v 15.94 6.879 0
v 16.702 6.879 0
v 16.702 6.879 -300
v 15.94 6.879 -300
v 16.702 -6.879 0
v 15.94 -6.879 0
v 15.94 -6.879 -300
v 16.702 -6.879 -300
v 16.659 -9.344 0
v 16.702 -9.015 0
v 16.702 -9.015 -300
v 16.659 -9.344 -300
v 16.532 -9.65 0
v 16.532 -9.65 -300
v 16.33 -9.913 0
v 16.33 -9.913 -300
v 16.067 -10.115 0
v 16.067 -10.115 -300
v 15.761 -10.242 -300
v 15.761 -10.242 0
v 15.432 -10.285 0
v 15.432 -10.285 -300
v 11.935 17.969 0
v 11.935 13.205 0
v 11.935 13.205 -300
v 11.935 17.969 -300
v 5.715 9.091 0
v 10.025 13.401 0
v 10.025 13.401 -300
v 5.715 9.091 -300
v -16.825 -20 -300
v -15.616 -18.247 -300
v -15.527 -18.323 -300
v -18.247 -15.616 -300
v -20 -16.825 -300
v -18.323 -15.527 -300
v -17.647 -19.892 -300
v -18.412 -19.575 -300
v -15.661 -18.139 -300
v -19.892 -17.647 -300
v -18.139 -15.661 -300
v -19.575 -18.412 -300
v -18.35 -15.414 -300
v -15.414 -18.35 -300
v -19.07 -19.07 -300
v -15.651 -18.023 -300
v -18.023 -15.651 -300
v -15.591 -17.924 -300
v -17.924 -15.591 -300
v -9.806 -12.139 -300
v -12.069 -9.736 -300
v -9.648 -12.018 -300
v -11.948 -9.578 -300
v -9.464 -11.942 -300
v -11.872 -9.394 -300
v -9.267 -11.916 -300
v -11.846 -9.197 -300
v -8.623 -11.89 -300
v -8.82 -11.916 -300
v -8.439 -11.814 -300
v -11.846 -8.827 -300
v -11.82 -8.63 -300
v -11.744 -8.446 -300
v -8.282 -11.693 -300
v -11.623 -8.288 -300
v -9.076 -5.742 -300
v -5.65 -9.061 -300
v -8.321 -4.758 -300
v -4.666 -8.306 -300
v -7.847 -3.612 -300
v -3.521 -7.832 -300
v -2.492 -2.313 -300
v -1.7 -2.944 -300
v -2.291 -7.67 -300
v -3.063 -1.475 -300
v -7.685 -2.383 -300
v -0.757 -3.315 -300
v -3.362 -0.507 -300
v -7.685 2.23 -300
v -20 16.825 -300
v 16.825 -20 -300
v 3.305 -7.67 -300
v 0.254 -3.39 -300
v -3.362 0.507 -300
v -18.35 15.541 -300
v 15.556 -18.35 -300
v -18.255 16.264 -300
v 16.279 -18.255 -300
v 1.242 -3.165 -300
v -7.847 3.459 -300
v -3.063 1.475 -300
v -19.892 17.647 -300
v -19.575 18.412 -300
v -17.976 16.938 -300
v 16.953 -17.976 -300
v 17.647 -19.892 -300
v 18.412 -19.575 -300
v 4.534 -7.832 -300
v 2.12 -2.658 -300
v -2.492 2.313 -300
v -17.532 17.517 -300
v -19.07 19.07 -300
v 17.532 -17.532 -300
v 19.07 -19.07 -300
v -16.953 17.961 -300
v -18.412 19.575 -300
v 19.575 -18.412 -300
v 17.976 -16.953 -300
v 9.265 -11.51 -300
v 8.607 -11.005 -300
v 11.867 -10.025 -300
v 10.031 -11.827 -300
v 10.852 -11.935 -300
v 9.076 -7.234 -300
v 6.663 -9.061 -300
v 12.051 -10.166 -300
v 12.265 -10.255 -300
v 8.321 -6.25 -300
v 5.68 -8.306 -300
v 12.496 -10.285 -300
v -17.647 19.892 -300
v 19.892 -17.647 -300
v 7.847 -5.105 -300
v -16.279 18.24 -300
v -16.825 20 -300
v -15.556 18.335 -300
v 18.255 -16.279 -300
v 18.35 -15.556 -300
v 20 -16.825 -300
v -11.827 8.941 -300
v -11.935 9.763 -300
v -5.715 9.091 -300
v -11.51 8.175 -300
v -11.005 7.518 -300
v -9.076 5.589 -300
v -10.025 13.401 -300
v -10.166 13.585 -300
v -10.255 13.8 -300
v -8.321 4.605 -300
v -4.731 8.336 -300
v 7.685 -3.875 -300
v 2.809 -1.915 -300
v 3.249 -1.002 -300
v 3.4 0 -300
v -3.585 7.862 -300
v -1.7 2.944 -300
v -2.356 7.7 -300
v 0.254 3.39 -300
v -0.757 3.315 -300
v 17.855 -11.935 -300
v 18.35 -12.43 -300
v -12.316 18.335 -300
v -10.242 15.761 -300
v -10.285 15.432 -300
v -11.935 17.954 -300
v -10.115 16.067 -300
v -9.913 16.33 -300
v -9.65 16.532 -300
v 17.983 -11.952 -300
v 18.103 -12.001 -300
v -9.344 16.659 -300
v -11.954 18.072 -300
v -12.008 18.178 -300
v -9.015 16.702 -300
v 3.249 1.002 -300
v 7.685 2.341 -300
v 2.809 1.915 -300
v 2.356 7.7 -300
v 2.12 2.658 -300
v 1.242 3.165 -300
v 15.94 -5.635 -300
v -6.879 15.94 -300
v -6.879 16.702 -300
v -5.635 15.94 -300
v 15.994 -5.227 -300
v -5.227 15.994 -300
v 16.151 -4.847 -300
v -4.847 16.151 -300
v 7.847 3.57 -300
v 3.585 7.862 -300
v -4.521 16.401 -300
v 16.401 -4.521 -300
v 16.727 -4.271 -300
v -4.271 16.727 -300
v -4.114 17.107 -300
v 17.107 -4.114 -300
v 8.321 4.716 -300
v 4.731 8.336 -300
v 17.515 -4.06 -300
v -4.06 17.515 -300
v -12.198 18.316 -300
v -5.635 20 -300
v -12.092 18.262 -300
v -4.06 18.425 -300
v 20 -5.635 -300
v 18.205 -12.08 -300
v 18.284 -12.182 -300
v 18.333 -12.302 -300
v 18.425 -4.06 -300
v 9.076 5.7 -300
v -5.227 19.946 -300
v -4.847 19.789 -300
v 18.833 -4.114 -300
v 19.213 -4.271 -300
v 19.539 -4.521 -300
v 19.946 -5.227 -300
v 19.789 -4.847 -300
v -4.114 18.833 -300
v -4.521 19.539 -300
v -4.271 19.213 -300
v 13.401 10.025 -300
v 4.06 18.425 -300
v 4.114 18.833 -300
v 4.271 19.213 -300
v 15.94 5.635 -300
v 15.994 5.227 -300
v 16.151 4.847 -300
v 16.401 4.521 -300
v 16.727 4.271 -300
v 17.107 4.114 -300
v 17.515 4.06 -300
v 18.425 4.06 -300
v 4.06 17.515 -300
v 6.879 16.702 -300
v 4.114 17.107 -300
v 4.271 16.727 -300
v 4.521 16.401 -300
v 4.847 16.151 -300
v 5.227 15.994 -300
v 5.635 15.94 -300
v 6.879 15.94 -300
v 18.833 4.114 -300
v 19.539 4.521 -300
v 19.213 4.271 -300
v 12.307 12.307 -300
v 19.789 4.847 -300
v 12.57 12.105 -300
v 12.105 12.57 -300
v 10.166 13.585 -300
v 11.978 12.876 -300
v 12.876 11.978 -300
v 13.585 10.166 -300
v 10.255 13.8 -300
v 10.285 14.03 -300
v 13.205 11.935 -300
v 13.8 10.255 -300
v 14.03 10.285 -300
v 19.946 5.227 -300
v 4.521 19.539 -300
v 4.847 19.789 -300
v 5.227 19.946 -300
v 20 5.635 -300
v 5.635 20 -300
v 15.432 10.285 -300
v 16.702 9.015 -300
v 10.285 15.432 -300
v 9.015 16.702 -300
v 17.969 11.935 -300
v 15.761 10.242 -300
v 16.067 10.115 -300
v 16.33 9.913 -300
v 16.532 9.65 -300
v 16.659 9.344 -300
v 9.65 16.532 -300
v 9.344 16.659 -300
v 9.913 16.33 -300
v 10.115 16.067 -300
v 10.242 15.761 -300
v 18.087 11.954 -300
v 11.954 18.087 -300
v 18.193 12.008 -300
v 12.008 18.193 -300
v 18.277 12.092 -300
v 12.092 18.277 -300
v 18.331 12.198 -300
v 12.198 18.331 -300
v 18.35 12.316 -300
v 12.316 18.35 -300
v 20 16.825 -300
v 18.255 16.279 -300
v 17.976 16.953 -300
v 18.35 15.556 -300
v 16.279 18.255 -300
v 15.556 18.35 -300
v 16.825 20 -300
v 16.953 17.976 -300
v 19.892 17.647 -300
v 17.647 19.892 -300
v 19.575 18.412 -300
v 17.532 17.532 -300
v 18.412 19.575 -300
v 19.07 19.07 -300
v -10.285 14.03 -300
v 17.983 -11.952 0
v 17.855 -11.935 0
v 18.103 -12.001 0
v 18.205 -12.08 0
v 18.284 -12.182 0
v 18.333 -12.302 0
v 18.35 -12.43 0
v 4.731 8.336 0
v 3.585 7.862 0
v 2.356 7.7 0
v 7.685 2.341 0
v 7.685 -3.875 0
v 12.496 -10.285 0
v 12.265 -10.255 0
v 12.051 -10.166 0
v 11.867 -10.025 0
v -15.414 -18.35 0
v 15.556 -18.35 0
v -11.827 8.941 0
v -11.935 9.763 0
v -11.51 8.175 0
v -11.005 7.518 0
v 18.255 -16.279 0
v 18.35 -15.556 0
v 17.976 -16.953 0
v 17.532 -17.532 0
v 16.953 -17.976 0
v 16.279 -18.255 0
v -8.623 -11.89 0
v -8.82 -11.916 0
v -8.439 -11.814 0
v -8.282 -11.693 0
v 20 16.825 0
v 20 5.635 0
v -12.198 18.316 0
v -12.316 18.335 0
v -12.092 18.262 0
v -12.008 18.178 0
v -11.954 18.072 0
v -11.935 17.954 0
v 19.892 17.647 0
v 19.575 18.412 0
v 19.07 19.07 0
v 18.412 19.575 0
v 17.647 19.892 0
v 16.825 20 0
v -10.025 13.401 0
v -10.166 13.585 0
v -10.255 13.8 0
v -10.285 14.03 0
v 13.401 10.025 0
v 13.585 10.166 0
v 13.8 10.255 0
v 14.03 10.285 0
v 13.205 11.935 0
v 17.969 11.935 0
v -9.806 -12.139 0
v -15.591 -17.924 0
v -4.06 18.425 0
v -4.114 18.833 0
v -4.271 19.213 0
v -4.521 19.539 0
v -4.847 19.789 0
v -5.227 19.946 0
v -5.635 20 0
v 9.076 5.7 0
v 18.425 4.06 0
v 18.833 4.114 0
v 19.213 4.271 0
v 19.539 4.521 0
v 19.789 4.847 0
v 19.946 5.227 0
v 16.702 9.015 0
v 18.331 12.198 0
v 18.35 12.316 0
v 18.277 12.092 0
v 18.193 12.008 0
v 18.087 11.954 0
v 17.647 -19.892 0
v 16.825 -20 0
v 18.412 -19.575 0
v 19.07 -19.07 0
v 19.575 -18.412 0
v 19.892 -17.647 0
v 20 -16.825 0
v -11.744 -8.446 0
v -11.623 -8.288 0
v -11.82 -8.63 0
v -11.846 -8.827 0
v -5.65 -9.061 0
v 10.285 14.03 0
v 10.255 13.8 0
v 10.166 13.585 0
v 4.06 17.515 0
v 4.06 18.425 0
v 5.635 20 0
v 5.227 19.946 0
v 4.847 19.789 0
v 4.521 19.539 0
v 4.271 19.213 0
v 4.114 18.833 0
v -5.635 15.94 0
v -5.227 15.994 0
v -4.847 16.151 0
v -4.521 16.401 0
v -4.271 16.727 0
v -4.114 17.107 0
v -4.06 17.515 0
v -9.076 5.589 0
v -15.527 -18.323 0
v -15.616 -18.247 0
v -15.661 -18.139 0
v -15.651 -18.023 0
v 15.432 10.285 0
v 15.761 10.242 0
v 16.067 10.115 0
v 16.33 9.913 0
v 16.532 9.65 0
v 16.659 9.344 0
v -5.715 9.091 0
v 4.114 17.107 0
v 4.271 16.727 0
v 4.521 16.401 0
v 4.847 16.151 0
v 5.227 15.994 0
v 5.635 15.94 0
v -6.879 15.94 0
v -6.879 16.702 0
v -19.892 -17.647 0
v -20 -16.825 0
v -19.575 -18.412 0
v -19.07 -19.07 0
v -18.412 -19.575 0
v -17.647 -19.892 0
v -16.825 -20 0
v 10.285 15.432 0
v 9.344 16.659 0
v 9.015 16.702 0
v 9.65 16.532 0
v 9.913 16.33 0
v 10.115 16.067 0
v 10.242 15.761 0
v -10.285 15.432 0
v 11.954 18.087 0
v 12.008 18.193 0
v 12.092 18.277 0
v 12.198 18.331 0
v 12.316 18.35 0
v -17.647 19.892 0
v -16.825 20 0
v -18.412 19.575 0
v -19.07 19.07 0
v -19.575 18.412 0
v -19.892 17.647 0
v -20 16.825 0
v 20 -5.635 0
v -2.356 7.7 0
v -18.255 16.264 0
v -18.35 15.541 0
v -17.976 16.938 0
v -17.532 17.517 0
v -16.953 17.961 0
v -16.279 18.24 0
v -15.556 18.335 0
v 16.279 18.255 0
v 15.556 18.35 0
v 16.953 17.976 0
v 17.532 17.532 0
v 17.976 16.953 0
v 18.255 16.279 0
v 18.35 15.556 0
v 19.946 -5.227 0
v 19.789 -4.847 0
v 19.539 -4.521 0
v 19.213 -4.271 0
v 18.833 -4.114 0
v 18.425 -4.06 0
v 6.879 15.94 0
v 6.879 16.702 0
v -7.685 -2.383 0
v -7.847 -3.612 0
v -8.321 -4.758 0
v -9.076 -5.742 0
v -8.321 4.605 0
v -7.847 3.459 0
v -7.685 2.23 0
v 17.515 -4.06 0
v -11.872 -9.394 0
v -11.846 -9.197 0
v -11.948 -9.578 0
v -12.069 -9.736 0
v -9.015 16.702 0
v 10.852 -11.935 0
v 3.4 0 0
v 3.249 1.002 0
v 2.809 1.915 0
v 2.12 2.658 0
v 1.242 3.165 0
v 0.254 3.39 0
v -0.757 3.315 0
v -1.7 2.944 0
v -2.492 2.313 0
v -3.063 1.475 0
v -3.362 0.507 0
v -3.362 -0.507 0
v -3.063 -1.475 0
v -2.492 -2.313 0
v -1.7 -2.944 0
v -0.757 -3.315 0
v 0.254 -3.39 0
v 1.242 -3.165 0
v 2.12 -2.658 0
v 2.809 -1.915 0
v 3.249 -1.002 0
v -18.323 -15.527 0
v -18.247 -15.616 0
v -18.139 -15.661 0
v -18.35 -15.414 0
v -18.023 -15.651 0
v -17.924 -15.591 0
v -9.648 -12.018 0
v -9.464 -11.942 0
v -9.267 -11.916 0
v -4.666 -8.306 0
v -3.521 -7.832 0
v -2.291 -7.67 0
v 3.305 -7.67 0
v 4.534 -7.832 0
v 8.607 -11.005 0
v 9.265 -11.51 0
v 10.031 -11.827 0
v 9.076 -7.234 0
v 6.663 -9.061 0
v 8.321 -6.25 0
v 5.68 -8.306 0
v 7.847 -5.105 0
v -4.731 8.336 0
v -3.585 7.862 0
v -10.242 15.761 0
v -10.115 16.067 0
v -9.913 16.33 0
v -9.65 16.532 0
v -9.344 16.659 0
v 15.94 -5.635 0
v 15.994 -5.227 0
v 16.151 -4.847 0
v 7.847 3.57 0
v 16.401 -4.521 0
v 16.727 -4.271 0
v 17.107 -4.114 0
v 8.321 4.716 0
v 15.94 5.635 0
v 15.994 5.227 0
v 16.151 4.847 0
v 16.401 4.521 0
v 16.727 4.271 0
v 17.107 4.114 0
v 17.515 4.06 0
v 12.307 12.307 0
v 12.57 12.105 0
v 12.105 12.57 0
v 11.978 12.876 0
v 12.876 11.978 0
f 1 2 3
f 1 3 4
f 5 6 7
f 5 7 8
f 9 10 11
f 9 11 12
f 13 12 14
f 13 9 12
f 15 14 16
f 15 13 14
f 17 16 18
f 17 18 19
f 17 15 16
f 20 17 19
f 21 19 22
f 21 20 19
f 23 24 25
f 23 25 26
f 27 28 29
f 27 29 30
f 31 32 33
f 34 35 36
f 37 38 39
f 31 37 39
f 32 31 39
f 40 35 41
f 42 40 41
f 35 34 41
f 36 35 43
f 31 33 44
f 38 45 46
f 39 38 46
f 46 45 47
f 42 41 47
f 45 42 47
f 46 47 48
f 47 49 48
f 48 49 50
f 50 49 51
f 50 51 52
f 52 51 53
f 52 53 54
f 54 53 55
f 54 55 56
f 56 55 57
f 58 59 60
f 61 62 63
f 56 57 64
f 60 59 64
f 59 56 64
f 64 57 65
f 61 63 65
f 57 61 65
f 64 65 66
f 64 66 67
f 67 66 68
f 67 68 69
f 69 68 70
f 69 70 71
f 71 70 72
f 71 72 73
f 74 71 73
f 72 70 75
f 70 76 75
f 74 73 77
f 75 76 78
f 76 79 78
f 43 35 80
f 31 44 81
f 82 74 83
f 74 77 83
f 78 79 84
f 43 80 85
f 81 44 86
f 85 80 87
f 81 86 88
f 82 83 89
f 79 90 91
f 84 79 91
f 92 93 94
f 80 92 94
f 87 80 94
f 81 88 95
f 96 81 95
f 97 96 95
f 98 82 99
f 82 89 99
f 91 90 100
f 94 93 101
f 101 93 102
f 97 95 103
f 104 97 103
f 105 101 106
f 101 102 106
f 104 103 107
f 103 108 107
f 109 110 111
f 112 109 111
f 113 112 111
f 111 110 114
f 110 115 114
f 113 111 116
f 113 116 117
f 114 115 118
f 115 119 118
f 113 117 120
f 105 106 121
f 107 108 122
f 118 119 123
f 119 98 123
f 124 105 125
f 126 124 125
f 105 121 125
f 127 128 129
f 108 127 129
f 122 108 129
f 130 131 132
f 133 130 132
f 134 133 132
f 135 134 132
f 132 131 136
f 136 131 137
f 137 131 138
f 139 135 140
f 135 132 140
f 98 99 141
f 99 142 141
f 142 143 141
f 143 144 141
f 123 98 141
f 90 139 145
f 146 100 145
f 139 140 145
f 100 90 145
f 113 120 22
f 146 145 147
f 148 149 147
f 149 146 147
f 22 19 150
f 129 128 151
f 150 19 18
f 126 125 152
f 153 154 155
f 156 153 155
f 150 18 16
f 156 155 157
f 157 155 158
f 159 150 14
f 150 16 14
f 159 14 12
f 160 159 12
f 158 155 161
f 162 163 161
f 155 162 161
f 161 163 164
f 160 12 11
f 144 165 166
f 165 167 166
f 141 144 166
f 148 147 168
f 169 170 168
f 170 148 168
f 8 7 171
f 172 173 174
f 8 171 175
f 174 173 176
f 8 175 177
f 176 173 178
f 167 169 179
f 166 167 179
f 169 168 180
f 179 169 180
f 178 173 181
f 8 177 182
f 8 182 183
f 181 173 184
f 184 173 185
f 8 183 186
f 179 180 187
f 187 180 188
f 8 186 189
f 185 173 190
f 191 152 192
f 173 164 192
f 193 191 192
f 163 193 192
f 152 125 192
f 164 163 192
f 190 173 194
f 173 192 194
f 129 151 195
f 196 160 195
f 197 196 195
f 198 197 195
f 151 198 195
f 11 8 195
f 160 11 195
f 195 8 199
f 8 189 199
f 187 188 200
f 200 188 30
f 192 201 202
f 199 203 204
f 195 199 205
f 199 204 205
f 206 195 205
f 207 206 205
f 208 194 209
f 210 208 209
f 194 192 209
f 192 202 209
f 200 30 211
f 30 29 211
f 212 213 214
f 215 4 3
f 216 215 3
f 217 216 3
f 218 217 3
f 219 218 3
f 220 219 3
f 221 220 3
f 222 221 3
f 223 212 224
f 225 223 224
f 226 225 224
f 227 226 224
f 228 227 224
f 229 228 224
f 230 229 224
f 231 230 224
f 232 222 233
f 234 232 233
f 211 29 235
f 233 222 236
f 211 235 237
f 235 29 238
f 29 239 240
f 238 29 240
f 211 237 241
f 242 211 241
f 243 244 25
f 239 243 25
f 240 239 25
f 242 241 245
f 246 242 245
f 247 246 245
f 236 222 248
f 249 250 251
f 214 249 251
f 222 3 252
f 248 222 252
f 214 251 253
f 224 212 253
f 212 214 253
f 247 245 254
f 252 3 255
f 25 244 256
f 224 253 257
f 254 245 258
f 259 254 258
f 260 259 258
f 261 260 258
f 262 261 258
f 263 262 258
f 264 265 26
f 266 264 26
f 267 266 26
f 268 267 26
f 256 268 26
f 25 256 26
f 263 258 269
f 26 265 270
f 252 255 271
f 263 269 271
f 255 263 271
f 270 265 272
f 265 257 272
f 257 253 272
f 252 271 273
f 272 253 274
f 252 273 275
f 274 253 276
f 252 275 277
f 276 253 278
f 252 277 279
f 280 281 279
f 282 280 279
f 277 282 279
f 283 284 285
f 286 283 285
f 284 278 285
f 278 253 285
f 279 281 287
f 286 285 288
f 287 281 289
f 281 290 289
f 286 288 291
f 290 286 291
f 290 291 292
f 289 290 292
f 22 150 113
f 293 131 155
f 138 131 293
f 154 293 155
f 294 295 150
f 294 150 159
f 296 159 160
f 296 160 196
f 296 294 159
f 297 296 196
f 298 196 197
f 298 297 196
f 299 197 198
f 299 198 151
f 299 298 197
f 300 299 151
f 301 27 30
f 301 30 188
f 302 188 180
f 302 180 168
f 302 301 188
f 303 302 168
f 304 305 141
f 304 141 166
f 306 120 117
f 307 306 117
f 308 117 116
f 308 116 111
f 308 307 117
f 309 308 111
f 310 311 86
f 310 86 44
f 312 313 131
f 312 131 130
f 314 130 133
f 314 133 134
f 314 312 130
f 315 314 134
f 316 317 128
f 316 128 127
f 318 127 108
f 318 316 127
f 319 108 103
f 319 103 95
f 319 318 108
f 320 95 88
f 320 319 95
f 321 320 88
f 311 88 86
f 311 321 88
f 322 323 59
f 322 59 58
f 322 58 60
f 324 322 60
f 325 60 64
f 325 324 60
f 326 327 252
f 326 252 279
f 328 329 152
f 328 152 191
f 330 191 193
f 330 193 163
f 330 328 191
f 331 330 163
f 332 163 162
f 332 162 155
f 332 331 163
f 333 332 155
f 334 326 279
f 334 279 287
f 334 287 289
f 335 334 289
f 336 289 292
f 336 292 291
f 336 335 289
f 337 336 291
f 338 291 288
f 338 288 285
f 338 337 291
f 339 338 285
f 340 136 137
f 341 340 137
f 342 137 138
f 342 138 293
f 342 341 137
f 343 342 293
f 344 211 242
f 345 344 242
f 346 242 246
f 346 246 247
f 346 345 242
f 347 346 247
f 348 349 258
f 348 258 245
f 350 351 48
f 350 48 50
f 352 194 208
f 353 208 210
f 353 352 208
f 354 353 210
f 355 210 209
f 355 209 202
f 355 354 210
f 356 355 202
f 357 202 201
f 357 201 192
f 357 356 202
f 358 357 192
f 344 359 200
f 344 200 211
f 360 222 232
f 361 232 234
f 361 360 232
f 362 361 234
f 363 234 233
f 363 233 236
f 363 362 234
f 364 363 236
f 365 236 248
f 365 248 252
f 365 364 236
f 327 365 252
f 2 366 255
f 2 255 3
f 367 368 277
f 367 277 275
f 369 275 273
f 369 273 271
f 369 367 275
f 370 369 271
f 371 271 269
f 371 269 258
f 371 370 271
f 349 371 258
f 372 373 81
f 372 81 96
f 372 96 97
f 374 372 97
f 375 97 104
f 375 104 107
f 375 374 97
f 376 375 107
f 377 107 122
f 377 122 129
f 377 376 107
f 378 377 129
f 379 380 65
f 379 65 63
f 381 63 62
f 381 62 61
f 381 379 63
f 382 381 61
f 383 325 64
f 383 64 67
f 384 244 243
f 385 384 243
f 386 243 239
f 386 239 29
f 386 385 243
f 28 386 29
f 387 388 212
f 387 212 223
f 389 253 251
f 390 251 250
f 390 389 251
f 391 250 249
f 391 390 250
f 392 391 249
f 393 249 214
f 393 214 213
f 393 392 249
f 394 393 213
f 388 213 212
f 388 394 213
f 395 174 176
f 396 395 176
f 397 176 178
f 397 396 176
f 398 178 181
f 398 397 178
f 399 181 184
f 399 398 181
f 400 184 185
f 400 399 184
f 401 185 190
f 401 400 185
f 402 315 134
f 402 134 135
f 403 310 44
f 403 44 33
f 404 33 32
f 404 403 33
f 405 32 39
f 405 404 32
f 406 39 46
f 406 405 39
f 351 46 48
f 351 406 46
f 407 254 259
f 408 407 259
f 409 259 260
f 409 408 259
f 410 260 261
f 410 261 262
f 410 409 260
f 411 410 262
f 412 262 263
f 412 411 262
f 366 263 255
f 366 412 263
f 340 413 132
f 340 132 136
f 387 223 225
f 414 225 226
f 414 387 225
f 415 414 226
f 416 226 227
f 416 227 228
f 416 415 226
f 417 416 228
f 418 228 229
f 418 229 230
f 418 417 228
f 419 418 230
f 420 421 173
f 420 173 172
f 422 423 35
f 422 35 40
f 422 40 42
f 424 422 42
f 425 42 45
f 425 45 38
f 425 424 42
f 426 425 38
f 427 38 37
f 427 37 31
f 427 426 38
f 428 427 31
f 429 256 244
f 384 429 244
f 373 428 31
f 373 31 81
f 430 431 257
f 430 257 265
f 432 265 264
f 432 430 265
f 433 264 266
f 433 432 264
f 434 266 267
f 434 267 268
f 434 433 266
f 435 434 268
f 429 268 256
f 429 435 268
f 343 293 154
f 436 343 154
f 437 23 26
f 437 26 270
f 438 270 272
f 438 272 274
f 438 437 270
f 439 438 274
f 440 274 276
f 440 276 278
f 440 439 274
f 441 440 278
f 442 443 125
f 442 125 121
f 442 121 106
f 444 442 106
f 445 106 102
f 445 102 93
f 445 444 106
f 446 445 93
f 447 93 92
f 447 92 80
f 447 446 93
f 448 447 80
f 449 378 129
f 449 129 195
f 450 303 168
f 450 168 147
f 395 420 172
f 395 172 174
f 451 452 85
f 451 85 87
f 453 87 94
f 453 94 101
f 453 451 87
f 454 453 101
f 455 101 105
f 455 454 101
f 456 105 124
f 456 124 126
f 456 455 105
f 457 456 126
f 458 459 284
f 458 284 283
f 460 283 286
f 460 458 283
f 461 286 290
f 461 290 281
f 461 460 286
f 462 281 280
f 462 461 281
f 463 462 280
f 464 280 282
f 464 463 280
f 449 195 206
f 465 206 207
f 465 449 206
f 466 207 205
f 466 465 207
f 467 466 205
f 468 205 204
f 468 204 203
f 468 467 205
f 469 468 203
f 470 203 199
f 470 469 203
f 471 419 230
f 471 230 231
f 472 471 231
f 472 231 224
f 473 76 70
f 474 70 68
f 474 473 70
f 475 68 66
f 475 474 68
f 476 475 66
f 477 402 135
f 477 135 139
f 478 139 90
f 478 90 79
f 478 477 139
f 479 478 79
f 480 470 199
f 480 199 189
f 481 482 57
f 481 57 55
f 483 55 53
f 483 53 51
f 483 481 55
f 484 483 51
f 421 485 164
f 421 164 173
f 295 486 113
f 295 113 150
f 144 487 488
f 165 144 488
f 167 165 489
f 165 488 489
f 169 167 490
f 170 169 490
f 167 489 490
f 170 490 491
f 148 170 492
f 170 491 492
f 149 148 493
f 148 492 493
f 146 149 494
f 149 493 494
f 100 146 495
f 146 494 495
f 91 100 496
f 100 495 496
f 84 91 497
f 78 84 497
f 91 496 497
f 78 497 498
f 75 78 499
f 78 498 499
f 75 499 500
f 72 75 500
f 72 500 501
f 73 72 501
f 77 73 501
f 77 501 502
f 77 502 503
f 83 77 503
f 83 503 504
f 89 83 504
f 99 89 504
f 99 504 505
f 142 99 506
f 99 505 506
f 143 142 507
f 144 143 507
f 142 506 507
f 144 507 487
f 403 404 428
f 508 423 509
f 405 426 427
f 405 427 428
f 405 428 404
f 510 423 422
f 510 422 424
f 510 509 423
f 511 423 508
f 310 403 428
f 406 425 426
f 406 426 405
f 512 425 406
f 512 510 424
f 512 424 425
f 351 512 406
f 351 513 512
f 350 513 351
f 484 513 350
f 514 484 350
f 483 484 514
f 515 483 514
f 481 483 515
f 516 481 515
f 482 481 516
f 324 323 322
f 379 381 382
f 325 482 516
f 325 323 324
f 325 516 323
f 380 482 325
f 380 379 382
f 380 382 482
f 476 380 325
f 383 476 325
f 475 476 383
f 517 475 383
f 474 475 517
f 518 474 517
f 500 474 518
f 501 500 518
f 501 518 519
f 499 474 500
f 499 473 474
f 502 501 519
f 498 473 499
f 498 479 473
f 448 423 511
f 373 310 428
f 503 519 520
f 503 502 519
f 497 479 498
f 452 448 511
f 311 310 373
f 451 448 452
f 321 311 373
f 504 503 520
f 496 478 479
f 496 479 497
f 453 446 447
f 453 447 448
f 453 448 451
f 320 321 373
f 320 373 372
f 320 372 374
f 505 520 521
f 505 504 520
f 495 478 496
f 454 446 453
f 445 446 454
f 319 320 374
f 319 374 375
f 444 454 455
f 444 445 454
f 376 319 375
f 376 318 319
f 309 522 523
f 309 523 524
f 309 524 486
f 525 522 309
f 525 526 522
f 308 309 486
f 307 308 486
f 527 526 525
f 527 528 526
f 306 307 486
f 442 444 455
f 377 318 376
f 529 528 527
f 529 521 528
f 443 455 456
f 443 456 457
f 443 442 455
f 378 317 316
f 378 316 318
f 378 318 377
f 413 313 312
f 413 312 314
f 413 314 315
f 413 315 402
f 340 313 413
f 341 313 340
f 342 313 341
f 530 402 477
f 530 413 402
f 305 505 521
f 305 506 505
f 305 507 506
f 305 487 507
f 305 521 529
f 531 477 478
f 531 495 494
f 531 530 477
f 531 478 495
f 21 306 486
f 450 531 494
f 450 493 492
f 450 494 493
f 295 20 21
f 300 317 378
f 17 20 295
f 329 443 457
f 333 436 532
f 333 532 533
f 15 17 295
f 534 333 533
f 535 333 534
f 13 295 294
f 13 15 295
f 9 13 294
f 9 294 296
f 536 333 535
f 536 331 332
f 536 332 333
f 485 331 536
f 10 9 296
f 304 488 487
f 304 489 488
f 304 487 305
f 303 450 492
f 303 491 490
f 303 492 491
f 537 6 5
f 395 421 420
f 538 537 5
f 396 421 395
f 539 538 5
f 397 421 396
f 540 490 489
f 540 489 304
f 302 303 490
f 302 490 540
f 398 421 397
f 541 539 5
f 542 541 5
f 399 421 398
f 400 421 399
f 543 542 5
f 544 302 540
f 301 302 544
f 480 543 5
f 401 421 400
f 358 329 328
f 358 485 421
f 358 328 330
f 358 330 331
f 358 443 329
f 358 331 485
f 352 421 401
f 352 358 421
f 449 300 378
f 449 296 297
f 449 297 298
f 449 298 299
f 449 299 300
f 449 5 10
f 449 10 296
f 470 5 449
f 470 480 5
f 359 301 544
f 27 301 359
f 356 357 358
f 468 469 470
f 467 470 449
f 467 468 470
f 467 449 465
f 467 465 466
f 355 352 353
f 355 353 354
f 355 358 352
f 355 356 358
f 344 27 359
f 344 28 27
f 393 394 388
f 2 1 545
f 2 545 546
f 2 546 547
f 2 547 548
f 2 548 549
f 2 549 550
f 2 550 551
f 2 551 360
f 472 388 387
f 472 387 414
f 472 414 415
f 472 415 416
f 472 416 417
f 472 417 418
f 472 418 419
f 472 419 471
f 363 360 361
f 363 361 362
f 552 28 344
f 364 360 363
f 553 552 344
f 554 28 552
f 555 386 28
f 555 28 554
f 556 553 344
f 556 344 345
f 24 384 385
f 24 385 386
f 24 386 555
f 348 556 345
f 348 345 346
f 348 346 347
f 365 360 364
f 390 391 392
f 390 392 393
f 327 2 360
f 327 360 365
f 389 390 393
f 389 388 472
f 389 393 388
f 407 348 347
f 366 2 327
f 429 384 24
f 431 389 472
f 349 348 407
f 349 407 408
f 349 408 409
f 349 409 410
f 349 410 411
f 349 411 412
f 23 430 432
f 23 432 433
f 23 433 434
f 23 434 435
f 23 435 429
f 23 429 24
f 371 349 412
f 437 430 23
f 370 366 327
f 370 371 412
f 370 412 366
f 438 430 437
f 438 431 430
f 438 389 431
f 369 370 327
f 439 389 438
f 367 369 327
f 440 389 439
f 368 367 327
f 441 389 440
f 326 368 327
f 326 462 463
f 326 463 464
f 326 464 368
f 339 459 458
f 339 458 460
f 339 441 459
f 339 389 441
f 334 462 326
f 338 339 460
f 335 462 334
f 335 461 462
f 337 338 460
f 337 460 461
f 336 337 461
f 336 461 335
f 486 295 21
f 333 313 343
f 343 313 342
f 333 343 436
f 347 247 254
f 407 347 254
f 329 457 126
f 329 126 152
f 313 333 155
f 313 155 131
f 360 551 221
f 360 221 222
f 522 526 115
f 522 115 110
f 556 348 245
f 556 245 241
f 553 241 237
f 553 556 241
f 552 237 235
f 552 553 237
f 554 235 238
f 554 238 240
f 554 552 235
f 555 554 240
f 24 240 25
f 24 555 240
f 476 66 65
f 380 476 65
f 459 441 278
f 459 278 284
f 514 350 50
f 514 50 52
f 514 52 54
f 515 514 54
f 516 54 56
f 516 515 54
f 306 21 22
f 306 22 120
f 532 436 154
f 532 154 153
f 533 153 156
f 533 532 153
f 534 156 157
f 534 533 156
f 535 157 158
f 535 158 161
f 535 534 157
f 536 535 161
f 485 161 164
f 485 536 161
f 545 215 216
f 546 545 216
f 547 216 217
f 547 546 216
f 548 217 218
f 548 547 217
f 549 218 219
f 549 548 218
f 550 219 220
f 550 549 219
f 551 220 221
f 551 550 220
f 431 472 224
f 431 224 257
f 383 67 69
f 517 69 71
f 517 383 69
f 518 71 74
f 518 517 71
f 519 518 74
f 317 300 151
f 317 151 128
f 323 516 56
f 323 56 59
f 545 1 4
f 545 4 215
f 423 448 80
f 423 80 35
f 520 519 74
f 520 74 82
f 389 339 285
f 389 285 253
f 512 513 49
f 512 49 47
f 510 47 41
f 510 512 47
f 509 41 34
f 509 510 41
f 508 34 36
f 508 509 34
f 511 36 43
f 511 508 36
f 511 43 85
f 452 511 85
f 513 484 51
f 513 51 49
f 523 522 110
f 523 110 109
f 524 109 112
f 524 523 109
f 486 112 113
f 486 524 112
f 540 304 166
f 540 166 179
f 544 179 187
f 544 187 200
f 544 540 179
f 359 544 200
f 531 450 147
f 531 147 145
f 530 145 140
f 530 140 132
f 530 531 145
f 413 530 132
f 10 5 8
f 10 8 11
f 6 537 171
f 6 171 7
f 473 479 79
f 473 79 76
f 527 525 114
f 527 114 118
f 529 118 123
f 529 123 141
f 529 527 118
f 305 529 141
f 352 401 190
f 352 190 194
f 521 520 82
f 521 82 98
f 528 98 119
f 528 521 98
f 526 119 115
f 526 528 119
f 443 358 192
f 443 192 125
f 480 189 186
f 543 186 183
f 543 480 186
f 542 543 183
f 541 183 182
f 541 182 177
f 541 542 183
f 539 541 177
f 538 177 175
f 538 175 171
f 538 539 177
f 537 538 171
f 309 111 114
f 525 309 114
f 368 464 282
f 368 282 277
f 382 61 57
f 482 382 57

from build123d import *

# Parameters (mm, degrees)
SKETCH1_R      = 3.4
EXTRUDE1_DEPTH = 300


with BuildPart() as part:
    # Sketch1 → Extrude1 (new body)
    with BuildSketch(Plane.XY):
        with BuildLine():
            Line((2.355963526, 7.7), (-2.355963526, 7.7))
            ThreePointArc((-2.355963526, 7.7), (-4.173633293, 8.061556996), (-5.714579315, 9.091184211))
            Line((-5.714579315, 9.091184211), (-10.024617928, 13.401222824))
            ThreePointArc((-10.024617928, 13.401222824), (-10.217328904, 13.689635181), (-10.285, 14.029840753))
            Line((-10.285, 14.029840753), (-10.285, 15.432464473))
            ThreePointArc((-10.285, 15.432464473), (-9.913025612, 16.330490085), (-9.015, 16.702464473))
            Line((-9.015, 16.702464473), (-6.878524829, 16.702464473))
            Line((-6.878524829, 16.702464473), (-6.878524829, 15.94))
            Line((-6.878524829, 15.94), (-5.6348, 15.94))
            ThreePointArc((-5.6348, 15.94), (-4.521248241, 16.401248241), (-4.06, 17.5148))
            Line((-4.06, 17.5148), (-4.06, 18.4252))
            ThreePointArc((-4.06, 18.4252), (-4.521248241, 19.538751759), (-5.6348, 20))
            Line((-5.6348, 20), (-13.185697325, 20))
            Line((-13.185697325, 20), (-16.825, 20))
            ThreePointArc((-16.825, 20), (-19.07006403, 19.07006403), (-20, 16.825))
            Line((-20, 16.825), (-20, -16.825))
            ThreePointArc((-20, -16.825), (-19.07006403, -19.07006403), (-16.825, -20))
            Line((-16.825, -20), (0, -20))
            Line((0, -20), (16.825, -20))
            ThreePointArc((16.825, -20), (19.07006403, -19.07006403), (20, -16.825))
            Line((20, -16.825), (20, -13.049478217))
            Line((20, -13.049478217), (20, -5.6348))
            ThreePointArc((20, -5.6348), (19.538751759, -4.521248241), (18.4252, -4.06))
            Line((18.4252, -4.06), (17.5148, -4.06))
            ThreePointArc((17.5148, -4.06), (16.401248241, -4.521248241), (15.94, -5.6348))
            Line((15.94, -5.6348), (15.94, -6.878524829))
            Line((15.94, -6.878524829), (16.702464473, -6.878524829))
            Line((16.702464473, -6.878524829), (16.702464473, -9.015))
            ThreePointArc((16.702464473, -9.015), (16.330490085, -9.913025612), (15.432464473, -10.285))
            Line((15.432464473, -10.285), (12.495583974, -10.285))
            ThreePointArc((12.495583974, -10.285), (12.155378402, -10.217328904), (11.866966045, -10.024617928))
            Line((11.866966045, -10.024617928), (9.076184211, -7.233836094))
            ThreePointArc((9.076184211, -7.233836094), (8.046556996, -5.692890072), (7.685, -3.875220305))
            Line((7.685, -3.875220305), (7.685, 2.340963526))
            ThreePointArc((7.685, 2.340963526), (8.046556996, 4.158633293), (9.076184211, 5.699579315))
            Line((9.076184211, 5.699579315), (13.401222824, 10.024617928))
            ThreePointArc((13.401222824, 10.024617928), (13.689635181, 10.217328904), (14.029840753, 10.285))
            Line((14.029840753, 10.285), (15.432, 10.285))
            ThreePointArc((15.432, 10.285), (16.330025612, 9.913025612), (16.702, 9.015))
            Line((16.702, 9.015), (16.702, 6.878524829))
            Line((16.702, 6.878524829), (15.94, 6.878524829))
            Line((15.94, 6.878524829), (15.94, 5.6348))
            ThreePointArc((15.94, 5.6348), (16.401248241, 4.521248241), (17.5148, 4.06))
            Line((17.5148, 4.06), (18.4252, 4.06))
            ThreePointArc((18.4252, 4.06), (19.538751759, 4.521248241), (20, 5.6348))
            Line((20, 5.6348), (20, 12.980521783))
            Line((20, 12.980521783), (20, 16.825))
            ThreePointArc((20, 16.825), (19.07006403, 19.07006403), (16.825, 20))
            Line((16.825, 20), (13.070898915, 20))
            Line((13.070898915, 20), (5.6348, 20))
            ThreePointArc((5.6348, 20), (4.521248241, 19.538751759), (4.06, 18.4252))
            Line((4.06, 18.4252), (4.06, 17.5148))
            ThreePointArc((4.06, 17.5148), (4.521248241, 16.401248241), (5.6348, 15.94))
            Line((5.6348, 15.94), (6.878524829, 15.94))
            Line((6.878524829, 15.94), (6.878524829, 16.702464473))
            Line((6.878524829, 16.702464473), (9.015, 16.702464473))
            ThreePointArc((9.015, 16.702464473), (9.913025612, 16.330490085), (10.285, 15.432464473))
            Line((10.285, 15.432464473), (10.285, 14.029840753))
            ThreePointArc((10.285, 14.029840753), (10.217328904, 13.689635181), (10.024617928, 13.401222824))
            Line((10.024617928, 13.401222824), (5.714579315, 9.091184211))
            ThreePointArc((5.714579315, 9.091184211), (4.173633293, 8.061556996), (2.355963526, 7.7))
        make_face()
        Circle(SKETCH1_R, mode=Mode.SUBTRACT)
        with BuildLine():
            Line((-2.291485309, -7.67), (3.30475018, -7.67))
            ThreePointArc((3.30475018, -7.67), (5.122419947, -8.031556996), (6.663365969, -9.061184211))
            Line((6.663365969, -9.061184211), (8.607245789, -11.00506403))
            ThreePointArc((8.607245789, -11.00506403), (9.637289921, -11.693317516), (10.852309819, -11.935))
            Line((10.852309819, -11.935), (17.855103644, -11.935))
            ThreePointArc((17.855103644, -11.935), (18.205048213, -12.079951787), (18.35, -12.429896356))
            Line((18.35, -12.429896356), (18.35, -15.556))
            ThreePointArc((18.35, -15.556), (17.531656347, -17.531656347), (15.556, -18.35))
            Line((15.556, -18.35), (0, -18.35))
            Line((0, -18.35), (-15.414104785, -18.35))
            ThreePointArc((-15.414104785, -18.35), (-15.644649678, -18.195954828), (-15.590556207, -17.924008585))
            Line((-15.590556207, -17.924008585), (-9.805562467, -12.139014844))
            ThreePointArc((-9.805562467, -12.139014844), (-9.558352324, -11.973834194), (-9.266748072, -11.915830212))
            Line((-9.266748072, -11.915830212), (-8.820376291, -11.915829642))
            ThreePointArc((-8.820376291, -11.915829642), (-8.528772039, -11.857825659), (-8.281561897, -11.692645009))
            Line((-8.281561897, -11.692645009), (-5.650101098, -9.061184211))
            ThreePointArc((-5.650101098, -9.061184211), (-4.109155076, -8.031556996), (-2.291485309, -7.67))
        make_face(mode=Mode.SUBTRACT)
        with BuildLine():
            Line((-9.076184211, -5.741552749), (-11.62265199, -8.288020528))
            ThreePointArc((-11.62265199, -8.288020528), (-11.787832613, -8.535230605), (-11.845836623, -8.826834781))
            Line((-11.845836623, -8.826834781), (-11.845837163, -9.196755164))
            ThreePointArc((-11.845837163, -9.196755164), (-11.903841173, -9.488359341), (-12.069021796, -9.735569418))
            Line((-12.069021796, -9.735569418), (-17.924008585, -15.590556207))
            ThreePointArc((-17.924008585, -15.590556207), (-18.195954828, -15.644649678), (-18.35, -15.414104785))
            Line((-18.35, -15.414104785), (-18.35, 15.541))
            ThreePointArc((-18.35, 15.541), (-17.531656347, 17.516656347), (-15.556, 18.335))
            Line((-15.556, 18.335), (-12.316, 18.335))
            ThreePointArc((-12.316, 18.335), (-12.046592316, 18.223407684), (-11.935, 17.954))
            Line((-11.935, 17.954), (-11.935, 9.762593298))
            ThreePointArc((-11.935, 9.762593298), (-11.693317516, 8.5475734), (-11.00506403, 7.517529268))
            Line((-11.00506403, 7.517529268), (-9.076184211, 5.588649448))
            ThreePointArc((-9.076184211, 5.588649448), (-8.046556996, 4.047703426), (-7.685, 2.230033659))
            Line((-7.685, 2.230033659), (-7.685, -2.382936959))
            ThreePointArc((-7.685, -2.382936959), (-8.046556996, -4.200606726), (-9.076184211, -5.741552749))
        make_face(mode=Mode.SUBTRACT)
        with BuildLine():
            Line((18.35, 15.556), (18.35, 12.316))
            ThreePointArc((18.35, 12.316), (18.238407684, 12.046592316), (17.969, 11.935))
            Line((17.969, 11.935), (13.205, 11.935))
            ThreePointArc((13.205, 11.935), (12.306974388, 12.306974388), (11.935, 13.205))
            Line((11.935, 13.205), (11.935, 17.969))
            ThreePointArc((11.935, 17.969), (12.046592316, 18.238407684), (12.316, 18.35))
            Line((12.316, 18.35), (15.556, 18.35))
            ThreePointArc((15.556, 18.35), (17.531656347, 17.531656347), (18.35, 15.556))
        make_face(mode=Mode.SUBTRACT)
    extrude(amount=-EXTRUDE1_DEPTH)


solid = part.part
